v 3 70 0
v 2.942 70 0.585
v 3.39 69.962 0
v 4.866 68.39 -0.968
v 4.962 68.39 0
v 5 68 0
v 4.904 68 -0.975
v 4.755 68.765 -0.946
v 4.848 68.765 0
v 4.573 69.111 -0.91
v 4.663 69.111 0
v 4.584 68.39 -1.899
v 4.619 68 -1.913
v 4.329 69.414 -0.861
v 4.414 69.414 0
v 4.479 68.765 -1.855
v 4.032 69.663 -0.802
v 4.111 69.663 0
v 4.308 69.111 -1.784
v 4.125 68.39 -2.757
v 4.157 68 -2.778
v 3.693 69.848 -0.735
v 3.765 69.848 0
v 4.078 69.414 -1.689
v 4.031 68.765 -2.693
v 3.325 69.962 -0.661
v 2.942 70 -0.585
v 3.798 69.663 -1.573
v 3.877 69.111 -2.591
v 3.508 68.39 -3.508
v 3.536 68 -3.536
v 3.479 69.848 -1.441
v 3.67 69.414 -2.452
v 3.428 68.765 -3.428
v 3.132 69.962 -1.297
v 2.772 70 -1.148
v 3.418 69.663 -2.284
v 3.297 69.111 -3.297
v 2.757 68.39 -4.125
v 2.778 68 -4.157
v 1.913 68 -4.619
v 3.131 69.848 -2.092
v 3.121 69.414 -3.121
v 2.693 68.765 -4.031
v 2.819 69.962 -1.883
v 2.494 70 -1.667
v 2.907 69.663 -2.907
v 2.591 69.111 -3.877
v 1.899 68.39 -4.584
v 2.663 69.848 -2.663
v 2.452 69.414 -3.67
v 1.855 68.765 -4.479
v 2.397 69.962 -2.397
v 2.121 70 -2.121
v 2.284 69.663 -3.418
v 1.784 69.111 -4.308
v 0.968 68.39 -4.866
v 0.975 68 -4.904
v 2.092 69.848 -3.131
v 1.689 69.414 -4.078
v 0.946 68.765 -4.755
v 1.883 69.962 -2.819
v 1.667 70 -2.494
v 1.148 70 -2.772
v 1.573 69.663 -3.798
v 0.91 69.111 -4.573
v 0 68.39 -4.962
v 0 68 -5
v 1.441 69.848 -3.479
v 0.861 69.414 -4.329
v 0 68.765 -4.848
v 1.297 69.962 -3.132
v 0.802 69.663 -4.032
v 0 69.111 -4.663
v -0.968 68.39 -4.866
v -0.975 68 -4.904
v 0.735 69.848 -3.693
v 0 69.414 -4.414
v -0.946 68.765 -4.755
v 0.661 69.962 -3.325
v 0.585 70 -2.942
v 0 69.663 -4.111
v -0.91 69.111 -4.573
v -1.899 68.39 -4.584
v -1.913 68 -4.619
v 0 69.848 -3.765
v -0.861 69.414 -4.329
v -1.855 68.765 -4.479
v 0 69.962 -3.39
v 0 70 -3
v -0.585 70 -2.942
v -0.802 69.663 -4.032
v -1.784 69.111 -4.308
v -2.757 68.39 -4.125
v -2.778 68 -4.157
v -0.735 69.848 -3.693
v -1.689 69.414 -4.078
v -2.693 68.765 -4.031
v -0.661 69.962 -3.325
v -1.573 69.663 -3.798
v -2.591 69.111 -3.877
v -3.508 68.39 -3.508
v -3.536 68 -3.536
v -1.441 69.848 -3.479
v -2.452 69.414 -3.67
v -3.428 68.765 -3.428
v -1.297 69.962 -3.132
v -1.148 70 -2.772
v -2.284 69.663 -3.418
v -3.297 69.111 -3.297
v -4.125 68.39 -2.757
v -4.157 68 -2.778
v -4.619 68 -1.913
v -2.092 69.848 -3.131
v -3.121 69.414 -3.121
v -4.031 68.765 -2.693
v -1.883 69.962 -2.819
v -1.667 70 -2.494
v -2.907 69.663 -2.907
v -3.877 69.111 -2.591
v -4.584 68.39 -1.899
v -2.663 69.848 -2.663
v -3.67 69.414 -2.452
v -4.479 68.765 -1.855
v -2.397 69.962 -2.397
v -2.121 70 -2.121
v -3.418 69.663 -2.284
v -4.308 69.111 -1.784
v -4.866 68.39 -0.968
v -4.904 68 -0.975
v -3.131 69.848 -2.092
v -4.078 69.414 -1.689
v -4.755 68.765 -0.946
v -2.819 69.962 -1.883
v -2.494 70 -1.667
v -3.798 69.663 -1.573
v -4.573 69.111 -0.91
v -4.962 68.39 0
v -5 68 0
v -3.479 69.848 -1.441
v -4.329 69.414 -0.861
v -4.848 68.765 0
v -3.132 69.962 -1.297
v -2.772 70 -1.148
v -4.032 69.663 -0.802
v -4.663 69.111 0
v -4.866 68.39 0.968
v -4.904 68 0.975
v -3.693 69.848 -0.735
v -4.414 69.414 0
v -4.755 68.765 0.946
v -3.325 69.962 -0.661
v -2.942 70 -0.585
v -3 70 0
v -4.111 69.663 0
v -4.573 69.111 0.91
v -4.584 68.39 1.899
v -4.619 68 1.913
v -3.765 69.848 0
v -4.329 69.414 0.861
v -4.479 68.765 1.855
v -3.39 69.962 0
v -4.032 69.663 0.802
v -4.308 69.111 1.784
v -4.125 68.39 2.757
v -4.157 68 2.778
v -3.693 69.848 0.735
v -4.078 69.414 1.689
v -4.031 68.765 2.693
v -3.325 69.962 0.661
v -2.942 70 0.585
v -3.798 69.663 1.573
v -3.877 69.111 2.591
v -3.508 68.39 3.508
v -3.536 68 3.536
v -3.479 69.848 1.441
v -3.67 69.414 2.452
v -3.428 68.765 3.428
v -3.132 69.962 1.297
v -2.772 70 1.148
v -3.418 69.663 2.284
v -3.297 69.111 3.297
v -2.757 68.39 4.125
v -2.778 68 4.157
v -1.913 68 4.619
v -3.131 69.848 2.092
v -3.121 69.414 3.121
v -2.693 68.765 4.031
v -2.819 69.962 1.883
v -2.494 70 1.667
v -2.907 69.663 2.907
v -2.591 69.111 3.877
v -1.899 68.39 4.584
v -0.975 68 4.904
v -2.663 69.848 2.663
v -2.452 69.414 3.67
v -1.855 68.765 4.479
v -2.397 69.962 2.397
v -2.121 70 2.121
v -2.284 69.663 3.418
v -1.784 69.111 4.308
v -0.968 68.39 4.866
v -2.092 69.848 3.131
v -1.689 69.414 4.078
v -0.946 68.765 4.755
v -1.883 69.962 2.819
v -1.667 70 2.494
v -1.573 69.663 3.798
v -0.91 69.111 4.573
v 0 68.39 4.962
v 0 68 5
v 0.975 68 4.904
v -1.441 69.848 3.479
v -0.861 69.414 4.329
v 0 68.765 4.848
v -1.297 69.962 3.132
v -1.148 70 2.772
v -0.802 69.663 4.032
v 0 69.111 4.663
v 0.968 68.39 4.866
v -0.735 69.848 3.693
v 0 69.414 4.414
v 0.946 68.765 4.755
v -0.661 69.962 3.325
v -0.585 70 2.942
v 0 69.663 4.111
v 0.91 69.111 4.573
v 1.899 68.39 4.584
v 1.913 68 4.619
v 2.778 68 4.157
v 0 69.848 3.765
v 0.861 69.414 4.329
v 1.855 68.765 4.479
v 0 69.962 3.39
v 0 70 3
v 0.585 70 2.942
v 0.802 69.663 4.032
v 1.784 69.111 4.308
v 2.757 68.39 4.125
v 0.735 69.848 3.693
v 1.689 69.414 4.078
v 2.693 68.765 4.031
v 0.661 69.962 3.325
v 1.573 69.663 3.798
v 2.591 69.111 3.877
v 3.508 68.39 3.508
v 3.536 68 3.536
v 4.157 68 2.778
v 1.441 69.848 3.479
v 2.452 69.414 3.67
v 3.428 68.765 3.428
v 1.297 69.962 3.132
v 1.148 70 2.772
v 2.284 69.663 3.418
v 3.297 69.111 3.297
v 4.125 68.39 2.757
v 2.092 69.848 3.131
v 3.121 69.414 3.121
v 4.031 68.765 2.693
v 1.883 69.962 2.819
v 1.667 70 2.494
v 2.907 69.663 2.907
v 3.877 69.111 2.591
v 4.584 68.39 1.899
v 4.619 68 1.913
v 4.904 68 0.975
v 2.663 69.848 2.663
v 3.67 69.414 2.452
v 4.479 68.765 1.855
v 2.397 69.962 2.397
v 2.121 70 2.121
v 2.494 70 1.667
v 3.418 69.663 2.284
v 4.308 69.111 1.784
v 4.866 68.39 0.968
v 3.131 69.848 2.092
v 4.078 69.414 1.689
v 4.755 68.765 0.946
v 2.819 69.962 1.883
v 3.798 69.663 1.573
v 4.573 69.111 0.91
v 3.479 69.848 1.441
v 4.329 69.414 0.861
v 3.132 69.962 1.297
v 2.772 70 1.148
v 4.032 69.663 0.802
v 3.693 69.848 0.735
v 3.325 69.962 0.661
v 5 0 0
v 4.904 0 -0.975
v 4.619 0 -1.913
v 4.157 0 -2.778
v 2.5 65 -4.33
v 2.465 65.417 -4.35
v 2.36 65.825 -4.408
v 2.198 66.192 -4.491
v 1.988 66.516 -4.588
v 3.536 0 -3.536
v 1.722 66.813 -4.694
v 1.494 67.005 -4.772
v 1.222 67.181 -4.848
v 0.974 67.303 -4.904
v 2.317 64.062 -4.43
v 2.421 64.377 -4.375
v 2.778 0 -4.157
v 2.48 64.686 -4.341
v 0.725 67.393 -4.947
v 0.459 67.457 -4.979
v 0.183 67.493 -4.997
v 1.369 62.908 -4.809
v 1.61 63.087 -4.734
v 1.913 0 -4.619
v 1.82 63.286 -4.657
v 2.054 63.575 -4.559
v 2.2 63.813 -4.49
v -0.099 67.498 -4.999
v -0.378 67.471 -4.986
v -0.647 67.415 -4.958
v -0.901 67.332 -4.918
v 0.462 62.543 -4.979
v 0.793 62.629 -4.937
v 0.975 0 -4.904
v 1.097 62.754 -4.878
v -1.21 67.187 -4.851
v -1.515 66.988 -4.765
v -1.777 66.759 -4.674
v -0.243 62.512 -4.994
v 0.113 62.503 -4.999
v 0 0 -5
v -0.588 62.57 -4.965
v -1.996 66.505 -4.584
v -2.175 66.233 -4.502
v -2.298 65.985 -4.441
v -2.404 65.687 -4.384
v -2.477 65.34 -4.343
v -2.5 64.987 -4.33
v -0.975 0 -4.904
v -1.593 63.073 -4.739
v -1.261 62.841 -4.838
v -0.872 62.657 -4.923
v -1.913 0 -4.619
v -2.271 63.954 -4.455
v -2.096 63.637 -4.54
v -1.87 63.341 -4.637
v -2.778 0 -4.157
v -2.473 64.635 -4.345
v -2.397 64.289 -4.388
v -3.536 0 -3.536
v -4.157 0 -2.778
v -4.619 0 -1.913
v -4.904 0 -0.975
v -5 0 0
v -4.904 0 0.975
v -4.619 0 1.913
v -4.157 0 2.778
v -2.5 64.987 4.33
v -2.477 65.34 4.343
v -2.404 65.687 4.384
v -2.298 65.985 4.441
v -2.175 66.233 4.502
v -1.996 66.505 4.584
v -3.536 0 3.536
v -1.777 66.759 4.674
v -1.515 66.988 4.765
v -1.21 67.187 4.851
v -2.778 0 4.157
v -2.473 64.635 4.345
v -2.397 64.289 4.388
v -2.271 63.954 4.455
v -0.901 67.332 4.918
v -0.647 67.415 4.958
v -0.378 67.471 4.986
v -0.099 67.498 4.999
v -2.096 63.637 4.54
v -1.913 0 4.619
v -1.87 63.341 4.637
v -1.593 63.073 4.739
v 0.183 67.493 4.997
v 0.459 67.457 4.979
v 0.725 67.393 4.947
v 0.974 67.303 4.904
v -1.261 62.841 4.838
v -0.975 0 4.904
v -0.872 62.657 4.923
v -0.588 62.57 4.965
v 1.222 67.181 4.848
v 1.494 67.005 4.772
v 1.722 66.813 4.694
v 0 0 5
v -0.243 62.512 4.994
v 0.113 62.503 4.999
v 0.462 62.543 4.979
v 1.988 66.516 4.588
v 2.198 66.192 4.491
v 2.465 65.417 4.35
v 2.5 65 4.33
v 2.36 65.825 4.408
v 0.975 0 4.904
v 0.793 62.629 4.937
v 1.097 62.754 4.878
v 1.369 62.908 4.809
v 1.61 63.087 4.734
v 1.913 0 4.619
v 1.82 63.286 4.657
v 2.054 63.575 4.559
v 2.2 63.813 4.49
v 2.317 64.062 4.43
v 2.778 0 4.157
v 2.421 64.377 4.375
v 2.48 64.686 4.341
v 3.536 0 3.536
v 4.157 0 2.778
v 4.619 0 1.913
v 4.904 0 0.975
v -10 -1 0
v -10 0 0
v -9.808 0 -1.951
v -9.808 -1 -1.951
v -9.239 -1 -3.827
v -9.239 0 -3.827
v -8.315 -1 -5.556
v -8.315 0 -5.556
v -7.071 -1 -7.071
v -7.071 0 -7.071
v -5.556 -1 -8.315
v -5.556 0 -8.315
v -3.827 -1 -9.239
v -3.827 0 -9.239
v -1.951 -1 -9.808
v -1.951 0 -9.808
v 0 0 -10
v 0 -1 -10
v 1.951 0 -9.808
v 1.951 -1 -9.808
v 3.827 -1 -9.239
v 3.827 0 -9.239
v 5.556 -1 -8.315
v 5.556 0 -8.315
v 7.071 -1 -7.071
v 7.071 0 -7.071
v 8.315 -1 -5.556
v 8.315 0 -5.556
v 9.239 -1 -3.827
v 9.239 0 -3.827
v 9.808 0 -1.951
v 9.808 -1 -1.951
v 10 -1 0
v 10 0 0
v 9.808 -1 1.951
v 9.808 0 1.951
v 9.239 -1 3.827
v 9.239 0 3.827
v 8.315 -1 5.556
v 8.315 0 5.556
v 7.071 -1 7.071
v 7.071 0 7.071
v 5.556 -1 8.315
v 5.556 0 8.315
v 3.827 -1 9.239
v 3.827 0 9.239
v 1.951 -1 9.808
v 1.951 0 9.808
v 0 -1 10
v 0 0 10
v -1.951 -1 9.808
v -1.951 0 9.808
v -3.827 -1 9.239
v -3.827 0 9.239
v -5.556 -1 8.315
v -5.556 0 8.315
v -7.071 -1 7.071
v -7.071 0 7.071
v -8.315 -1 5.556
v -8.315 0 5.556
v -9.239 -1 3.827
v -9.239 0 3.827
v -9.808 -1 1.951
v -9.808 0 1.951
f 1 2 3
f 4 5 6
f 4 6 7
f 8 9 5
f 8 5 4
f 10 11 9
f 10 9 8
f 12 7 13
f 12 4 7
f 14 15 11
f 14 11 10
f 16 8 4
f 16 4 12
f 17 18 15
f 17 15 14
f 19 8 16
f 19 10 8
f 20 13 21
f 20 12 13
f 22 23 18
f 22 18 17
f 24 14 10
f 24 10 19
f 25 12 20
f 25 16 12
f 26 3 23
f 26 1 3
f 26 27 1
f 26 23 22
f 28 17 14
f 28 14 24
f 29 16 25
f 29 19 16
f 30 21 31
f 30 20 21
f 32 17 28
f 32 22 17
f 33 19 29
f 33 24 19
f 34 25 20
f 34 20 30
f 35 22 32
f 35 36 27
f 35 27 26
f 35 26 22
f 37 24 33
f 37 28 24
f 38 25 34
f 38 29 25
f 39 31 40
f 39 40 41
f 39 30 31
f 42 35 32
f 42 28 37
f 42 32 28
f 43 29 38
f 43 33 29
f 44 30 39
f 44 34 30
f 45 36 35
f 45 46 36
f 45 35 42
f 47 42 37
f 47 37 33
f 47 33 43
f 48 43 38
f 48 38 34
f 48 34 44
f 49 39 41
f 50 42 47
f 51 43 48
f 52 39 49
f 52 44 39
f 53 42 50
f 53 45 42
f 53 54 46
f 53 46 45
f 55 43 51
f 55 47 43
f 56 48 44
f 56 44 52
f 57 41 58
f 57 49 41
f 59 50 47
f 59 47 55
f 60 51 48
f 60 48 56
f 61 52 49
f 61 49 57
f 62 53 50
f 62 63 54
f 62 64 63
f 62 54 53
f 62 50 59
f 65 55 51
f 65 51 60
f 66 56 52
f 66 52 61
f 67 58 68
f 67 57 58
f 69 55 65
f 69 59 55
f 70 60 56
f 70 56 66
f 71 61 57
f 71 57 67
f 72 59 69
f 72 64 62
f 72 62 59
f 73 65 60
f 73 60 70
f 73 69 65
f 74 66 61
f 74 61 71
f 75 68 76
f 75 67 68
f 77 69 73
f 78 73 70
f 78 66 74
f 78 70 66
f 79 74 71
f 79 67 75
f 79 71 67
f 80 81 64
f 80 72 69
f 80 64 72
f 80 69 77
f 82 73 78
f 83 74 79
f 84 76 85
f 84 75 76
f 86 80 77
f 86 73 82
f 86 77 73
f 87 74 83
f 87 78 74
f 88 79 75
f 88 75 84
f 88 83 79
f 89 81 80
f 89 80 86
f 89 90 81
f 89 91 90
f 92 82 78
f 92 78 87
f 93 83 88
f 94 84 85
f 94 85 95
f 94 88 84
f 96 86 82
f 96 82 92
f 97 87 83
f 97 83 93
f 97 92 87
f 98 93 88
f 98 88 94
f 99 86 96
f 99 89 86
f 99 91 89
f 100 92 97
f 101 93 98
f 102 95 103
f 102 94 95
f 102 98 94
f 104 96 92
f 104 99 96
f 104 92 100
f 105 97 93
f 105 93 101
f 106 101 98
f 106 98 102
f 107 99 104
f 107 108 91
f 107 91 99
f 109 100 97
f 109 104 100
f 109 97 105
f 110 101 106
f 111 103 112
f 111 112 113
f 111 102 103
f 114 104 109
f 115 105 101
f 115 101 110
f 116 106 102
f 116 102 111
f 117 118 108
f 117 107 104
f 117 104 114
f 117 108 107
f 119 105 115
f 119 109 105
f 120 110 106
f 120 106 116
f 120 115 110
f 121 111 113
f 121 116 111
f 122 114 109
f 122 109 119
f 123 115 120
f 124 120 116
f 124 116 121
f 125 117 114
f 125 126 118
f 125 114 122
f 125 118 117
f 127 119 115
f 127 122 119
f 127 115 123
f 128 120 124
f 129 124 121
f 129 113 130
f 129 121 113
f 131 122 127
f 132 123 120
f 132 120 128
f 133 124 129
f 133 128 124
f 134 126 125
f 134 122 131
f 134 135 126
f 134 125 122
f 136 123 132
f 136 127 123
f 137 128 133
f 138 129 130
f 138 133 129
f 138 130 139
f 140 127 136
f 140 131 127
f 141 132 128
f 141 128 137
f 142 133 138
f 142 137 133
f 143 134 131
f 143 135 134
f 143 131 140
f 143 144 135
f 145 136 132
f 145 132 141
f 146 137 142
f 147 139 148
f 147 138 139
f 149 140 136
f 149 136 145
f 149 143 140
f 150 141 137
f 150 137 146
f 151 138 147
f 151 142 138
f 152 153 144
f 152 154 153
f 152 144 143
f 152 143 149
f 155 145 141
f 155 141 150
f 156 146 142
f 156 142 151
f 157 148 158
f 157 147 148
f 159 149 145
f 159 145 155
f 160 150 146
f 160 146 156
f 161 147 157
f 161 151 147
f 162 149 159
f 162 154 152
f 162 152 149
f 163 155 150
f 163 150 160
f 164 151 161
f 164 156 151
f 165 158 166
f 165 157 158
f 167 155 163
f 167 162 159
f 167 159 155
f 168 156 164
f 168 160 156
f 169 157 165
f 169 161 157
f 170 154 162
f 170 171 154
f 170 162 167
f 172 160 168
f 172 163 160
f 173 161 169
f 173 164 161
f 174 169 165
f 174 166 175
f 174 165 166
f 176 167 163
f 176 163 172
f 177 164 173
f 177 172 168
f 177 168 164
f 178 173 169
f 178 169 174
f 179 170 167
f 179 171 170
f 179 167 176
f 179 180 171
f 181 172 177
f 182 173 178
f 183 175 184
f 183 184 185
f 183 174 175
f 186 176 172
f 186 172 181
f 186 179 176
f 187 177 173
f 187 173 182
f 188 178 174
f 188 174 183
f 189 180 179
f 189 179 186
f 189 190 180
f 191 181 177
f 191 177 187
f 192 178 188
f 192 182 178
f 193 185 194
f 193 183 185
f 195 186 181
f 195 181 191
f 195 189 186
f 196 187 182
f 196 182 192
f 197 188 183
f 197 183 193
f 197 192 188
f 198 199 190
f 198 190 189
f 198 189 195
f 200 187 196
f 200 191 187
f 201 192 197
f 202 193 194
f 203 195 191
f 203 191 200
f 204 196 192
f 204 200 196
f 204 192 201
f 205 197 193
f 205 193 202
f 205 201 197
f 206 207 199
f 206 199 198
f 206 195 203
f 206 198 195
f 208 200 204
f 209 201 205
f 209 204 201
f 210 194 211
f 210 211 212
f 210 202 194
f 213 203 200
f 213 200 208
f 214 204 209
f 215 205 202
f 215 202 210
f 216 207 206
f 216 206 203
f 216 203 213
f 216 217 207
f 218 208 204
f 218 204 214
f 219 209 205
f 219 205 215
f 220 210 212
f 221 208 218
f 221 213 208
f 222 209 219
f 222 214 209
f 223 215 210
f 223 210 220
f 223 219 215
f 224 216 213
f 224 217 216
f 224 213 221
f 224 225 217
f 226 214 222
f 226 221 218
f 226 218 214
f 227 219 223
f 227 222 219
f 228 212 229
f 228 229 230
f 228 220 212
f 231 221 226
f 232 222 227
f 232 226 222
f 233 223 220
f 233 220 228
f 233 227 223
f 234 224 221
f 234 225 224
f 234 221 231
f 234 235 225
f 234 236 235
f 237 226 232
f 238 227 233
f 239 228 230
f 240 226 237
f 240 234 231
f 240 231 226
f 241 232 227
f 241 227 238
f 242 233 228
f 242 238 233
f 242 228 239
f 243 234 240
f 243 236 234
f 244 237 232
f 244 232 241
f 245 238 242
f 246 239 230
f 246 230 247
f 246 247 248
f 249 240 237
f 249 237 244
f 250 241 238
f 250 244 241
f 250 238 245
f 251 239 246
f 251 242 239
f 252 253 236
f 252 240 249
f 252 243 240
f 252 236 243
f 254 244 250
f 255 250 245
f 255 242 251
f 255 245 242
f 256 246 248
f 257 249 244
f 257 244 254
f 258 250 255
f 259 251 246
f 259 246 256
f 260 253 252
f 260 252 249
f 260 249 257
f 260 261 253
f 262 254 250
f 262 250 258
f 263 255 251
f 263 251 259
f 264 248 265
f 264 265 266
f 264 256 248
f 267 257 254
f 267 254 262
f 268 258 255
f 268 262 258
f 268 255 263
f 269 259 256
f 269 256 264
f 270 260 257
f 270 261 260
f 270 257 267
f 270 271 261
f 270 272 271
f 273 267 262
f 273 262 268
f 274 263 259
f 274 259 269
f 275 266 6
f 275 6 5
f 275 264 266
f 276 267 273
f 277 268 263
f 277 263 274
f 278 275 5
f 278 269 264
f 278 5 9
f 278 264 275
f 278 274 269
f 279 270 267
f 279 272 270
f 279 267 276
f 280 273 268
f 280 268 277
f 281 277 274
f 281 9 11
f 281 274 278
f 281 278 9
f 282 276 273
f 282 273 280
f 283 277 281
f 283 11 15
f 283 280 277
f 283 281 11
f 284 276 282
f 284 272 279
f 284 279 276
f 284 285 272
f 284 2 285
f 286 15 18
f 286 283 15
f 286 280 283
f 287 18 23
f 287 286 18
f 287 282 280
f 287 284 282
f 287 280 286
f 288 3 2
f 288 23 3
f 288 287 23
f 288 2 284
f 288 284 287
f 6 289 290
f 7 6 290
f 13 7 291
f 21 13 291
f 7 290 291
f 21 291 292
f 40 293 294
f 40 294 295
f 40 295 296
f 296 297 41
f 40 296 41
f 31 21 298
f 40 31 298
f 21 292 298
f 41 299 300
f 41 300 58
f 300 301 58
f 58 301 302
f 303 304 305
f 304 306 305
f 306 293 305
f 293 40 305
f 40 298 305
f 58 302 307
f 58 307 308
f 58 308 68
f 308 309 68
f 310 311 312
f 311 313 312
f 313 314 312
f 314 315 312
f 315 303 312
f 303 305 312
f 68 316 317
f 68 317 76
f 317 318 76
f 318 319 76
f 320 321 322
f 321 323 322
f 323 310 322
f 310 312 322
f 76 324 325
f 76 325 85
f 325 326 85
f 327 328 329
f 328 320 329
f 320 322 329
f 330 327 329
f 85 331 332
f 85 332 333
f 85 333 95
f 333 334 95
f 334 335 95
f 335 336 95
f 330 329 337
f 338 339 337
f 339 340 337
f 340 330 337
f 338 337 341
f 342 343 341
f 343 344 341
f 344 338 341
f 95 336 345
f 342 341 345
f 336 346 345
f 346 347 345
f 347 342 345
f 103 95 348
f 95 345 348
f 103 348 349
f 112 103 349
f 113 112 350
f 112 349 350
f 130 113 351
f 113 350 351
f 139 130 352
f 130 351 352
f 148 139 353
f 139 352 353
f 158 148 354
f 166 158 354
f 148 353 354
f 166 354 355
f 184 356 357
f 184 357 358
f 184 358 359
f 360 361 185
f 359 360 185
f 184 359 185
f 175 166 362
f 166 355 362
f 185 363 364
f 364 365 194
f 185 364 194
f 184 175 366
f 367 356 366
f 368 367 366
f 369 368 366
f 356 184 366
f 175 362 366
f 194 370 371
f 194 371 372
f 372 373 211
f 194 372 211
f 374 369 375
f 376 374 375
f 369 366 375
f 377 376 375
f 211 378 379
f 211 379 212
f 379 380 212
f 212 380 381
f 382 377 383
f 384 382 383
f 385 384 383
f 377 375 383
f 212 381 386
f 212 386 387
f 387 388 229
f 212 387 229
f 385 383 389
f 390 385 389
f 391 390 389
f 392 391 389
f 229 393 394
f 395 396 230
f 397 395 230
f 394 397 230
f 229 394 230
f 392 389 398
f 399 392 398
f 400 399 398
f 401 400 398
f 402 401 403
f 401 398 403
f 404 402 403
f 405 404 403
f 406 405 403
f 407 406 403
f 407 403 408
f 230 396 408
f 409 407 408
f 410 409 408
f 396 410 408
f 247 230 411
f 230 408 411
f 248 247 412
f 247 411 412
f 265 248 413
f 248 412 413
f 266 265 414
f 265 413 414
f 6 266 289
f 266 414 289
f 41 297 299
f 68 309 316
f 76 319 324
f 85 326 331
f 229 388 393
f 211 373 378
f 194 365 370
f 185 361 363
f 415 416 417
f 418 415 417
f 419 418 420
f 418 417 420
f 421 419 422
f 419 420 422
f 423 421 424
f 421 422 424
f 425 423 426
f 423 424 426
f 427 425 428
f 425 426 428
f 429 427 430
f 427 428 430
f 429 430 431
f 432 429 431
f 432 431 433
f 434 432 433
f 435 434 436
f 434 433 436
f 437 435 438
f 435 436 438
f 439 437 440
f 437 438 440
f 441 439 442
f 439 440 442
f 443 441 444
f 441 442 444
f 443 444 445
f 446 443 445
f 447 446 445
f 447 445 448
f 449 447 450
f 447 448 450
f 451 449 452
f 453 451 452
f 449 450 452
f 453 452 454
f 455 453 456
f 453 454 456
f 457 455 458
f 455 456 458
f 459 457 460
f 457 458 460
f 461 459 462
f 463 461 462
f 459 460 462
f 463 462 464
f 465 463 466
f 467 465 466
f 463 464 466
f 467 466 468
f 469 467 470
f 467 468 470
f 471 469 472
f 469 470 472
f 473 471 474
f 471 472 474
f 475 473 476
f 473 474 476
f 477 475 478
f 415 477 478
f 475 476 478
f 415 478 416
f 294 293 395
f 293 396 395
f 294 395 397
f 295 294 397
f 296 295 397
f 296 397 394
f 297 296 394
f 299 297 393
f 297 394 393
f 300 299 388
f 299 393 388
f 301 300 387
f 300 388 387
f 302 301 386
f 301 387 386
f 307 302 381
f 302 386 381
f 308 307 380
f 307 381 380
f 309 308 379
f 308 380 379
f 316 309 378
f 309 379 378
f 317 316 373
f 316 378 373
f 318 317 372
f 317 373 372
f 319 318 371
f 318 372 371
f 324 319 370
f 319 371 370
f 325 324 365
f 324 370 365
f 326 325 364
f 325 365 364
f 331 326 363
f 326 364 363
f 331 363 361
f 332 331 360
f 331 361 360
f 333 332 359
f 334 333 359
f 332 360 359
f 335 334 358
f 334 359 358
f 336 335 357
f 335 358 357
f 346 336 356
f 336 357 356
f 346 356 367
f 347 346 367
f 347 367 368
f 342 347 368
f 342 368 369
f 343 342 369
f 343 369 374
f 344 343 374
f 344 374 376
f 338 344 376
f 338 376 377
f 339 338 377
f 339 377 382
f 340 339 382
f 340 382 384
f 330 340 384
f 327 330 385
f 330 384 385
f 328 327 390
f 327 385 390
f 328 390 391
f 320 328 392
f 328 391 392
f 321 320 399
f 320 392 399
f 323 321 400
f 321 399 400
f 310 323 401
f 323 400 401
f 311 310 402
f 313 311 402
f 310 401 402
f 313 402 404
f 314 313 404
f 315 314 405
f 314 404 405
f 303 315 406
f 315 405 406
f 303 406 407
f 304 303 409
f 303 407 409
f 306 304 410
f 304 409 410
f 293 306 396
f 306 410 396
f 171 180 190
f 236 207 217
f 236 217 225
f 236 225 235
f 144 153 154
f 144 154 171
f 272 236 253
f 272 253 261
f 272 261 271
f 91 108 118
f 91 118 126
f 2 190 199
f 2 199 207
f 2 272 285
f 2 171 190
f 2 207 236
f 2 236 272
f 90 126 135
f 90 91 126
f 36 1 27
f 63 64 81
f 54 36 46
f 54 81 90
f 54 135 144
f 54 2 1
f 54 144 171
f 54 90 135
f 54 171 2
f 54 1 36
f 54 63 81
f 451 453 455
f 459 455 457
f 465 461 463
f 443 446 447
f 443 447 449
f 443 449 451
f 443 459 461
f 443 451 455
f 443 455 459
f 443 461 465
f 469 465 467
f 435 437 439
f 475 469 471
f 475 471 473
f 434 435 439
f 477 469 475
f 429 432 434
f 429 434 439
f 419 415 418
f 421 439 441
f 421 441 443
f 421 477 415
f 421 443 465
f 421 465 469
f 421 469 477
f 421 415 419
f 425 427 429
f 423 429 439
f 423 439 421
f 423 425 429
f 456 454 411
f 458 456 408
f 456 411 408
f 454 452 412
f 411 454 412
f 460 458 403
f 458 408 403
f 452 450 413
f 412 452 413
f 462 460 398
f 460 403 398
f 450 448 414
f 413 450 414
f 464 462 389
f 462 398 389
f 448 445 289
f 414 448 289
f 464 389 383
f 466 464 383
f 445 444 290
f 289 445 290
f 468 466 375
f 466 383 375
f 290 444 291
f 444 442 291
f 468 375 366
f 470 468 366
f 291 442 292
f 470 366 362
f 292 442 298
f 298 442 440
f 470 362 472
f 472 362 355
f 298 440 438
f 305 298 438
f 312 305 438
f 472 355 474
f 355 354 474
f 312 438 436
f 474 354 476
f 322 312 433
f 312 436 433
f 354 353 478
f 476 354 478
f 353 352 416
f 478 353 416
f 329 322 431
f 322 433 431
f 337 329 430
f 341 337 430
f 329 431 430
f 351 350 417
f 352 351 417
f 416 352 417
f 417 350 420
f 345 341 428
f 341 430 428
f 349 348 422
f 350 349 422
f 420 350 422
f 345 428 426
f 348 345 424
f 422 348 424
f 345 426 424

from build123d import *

# Parameters (mm, degrees)
SCHIZZO1_R                    = 5
ESTRUSIONE_ESTRUSIONE1_DEPTH  = 70
RACCORDO1_R                   = 2
SCHIZZO2_R                    = 2.5
TAGLIO_ESTRUSIONE1_DEPTH      = 6
TAGLIO_ESTRUSIONE1_DEPTH_BACK = 6
SCHIZZO3_R                    = 10
ESTRUSIONE_ESTRUSIONE2_DEPTH  = 1


with BuildPart() as part:
    # Schizzo1 → Estrusione-Estrusione1 (new body)
    with BuildSketch(Plane(origin=(0, 0, 0), x_dir=(1, 0, 0), z_dir=(0, 1, 0))):
        Circle(SCHIZZO1_R)
    extrude(amount=ESTRUSIONE_ESTRUSIONE1_DEPTH)

    # Raccordo1
    raccordo1_edges = [part.edges().sort_by_distance(p)[0] for p in [
        (-5, 70, 0),
    ]]
    fillet(raccordo1_edges, radius=RACCORDO1_R)

    # Schizzo2 → Taglio-Estrusione1 (cut, two sides)
    with BuildSketch(Plane.XY) as taglio_estrusione1_sk:
        with Locations((0, 65)):
            Circle(SCHIZZO2_R)
    extrude(amount=TAGLIO_ESTRUSIONE1_DEPTH, mode=Mode.SUBTRACT)
    extrude(taglio_estrusione1_sk.sketch, amount=-TAGLIO_ESTRUSIONE1_DEPTH_BACK, mode=Mode.SUBTRACT)

    # Schizzo3 → Estrusione-Estrusione2 (add)
    with BuildSketch(Plane(origin=(0, 0, 0), x_dir=(-1, 0, 0), z_dir=(0, -1, 0))):
        Circle(SCHIZZO3_R)
    extrude(amount=ESTRUSIONE_ESTRUSIONE2_DEPTH)


solid = part.part
